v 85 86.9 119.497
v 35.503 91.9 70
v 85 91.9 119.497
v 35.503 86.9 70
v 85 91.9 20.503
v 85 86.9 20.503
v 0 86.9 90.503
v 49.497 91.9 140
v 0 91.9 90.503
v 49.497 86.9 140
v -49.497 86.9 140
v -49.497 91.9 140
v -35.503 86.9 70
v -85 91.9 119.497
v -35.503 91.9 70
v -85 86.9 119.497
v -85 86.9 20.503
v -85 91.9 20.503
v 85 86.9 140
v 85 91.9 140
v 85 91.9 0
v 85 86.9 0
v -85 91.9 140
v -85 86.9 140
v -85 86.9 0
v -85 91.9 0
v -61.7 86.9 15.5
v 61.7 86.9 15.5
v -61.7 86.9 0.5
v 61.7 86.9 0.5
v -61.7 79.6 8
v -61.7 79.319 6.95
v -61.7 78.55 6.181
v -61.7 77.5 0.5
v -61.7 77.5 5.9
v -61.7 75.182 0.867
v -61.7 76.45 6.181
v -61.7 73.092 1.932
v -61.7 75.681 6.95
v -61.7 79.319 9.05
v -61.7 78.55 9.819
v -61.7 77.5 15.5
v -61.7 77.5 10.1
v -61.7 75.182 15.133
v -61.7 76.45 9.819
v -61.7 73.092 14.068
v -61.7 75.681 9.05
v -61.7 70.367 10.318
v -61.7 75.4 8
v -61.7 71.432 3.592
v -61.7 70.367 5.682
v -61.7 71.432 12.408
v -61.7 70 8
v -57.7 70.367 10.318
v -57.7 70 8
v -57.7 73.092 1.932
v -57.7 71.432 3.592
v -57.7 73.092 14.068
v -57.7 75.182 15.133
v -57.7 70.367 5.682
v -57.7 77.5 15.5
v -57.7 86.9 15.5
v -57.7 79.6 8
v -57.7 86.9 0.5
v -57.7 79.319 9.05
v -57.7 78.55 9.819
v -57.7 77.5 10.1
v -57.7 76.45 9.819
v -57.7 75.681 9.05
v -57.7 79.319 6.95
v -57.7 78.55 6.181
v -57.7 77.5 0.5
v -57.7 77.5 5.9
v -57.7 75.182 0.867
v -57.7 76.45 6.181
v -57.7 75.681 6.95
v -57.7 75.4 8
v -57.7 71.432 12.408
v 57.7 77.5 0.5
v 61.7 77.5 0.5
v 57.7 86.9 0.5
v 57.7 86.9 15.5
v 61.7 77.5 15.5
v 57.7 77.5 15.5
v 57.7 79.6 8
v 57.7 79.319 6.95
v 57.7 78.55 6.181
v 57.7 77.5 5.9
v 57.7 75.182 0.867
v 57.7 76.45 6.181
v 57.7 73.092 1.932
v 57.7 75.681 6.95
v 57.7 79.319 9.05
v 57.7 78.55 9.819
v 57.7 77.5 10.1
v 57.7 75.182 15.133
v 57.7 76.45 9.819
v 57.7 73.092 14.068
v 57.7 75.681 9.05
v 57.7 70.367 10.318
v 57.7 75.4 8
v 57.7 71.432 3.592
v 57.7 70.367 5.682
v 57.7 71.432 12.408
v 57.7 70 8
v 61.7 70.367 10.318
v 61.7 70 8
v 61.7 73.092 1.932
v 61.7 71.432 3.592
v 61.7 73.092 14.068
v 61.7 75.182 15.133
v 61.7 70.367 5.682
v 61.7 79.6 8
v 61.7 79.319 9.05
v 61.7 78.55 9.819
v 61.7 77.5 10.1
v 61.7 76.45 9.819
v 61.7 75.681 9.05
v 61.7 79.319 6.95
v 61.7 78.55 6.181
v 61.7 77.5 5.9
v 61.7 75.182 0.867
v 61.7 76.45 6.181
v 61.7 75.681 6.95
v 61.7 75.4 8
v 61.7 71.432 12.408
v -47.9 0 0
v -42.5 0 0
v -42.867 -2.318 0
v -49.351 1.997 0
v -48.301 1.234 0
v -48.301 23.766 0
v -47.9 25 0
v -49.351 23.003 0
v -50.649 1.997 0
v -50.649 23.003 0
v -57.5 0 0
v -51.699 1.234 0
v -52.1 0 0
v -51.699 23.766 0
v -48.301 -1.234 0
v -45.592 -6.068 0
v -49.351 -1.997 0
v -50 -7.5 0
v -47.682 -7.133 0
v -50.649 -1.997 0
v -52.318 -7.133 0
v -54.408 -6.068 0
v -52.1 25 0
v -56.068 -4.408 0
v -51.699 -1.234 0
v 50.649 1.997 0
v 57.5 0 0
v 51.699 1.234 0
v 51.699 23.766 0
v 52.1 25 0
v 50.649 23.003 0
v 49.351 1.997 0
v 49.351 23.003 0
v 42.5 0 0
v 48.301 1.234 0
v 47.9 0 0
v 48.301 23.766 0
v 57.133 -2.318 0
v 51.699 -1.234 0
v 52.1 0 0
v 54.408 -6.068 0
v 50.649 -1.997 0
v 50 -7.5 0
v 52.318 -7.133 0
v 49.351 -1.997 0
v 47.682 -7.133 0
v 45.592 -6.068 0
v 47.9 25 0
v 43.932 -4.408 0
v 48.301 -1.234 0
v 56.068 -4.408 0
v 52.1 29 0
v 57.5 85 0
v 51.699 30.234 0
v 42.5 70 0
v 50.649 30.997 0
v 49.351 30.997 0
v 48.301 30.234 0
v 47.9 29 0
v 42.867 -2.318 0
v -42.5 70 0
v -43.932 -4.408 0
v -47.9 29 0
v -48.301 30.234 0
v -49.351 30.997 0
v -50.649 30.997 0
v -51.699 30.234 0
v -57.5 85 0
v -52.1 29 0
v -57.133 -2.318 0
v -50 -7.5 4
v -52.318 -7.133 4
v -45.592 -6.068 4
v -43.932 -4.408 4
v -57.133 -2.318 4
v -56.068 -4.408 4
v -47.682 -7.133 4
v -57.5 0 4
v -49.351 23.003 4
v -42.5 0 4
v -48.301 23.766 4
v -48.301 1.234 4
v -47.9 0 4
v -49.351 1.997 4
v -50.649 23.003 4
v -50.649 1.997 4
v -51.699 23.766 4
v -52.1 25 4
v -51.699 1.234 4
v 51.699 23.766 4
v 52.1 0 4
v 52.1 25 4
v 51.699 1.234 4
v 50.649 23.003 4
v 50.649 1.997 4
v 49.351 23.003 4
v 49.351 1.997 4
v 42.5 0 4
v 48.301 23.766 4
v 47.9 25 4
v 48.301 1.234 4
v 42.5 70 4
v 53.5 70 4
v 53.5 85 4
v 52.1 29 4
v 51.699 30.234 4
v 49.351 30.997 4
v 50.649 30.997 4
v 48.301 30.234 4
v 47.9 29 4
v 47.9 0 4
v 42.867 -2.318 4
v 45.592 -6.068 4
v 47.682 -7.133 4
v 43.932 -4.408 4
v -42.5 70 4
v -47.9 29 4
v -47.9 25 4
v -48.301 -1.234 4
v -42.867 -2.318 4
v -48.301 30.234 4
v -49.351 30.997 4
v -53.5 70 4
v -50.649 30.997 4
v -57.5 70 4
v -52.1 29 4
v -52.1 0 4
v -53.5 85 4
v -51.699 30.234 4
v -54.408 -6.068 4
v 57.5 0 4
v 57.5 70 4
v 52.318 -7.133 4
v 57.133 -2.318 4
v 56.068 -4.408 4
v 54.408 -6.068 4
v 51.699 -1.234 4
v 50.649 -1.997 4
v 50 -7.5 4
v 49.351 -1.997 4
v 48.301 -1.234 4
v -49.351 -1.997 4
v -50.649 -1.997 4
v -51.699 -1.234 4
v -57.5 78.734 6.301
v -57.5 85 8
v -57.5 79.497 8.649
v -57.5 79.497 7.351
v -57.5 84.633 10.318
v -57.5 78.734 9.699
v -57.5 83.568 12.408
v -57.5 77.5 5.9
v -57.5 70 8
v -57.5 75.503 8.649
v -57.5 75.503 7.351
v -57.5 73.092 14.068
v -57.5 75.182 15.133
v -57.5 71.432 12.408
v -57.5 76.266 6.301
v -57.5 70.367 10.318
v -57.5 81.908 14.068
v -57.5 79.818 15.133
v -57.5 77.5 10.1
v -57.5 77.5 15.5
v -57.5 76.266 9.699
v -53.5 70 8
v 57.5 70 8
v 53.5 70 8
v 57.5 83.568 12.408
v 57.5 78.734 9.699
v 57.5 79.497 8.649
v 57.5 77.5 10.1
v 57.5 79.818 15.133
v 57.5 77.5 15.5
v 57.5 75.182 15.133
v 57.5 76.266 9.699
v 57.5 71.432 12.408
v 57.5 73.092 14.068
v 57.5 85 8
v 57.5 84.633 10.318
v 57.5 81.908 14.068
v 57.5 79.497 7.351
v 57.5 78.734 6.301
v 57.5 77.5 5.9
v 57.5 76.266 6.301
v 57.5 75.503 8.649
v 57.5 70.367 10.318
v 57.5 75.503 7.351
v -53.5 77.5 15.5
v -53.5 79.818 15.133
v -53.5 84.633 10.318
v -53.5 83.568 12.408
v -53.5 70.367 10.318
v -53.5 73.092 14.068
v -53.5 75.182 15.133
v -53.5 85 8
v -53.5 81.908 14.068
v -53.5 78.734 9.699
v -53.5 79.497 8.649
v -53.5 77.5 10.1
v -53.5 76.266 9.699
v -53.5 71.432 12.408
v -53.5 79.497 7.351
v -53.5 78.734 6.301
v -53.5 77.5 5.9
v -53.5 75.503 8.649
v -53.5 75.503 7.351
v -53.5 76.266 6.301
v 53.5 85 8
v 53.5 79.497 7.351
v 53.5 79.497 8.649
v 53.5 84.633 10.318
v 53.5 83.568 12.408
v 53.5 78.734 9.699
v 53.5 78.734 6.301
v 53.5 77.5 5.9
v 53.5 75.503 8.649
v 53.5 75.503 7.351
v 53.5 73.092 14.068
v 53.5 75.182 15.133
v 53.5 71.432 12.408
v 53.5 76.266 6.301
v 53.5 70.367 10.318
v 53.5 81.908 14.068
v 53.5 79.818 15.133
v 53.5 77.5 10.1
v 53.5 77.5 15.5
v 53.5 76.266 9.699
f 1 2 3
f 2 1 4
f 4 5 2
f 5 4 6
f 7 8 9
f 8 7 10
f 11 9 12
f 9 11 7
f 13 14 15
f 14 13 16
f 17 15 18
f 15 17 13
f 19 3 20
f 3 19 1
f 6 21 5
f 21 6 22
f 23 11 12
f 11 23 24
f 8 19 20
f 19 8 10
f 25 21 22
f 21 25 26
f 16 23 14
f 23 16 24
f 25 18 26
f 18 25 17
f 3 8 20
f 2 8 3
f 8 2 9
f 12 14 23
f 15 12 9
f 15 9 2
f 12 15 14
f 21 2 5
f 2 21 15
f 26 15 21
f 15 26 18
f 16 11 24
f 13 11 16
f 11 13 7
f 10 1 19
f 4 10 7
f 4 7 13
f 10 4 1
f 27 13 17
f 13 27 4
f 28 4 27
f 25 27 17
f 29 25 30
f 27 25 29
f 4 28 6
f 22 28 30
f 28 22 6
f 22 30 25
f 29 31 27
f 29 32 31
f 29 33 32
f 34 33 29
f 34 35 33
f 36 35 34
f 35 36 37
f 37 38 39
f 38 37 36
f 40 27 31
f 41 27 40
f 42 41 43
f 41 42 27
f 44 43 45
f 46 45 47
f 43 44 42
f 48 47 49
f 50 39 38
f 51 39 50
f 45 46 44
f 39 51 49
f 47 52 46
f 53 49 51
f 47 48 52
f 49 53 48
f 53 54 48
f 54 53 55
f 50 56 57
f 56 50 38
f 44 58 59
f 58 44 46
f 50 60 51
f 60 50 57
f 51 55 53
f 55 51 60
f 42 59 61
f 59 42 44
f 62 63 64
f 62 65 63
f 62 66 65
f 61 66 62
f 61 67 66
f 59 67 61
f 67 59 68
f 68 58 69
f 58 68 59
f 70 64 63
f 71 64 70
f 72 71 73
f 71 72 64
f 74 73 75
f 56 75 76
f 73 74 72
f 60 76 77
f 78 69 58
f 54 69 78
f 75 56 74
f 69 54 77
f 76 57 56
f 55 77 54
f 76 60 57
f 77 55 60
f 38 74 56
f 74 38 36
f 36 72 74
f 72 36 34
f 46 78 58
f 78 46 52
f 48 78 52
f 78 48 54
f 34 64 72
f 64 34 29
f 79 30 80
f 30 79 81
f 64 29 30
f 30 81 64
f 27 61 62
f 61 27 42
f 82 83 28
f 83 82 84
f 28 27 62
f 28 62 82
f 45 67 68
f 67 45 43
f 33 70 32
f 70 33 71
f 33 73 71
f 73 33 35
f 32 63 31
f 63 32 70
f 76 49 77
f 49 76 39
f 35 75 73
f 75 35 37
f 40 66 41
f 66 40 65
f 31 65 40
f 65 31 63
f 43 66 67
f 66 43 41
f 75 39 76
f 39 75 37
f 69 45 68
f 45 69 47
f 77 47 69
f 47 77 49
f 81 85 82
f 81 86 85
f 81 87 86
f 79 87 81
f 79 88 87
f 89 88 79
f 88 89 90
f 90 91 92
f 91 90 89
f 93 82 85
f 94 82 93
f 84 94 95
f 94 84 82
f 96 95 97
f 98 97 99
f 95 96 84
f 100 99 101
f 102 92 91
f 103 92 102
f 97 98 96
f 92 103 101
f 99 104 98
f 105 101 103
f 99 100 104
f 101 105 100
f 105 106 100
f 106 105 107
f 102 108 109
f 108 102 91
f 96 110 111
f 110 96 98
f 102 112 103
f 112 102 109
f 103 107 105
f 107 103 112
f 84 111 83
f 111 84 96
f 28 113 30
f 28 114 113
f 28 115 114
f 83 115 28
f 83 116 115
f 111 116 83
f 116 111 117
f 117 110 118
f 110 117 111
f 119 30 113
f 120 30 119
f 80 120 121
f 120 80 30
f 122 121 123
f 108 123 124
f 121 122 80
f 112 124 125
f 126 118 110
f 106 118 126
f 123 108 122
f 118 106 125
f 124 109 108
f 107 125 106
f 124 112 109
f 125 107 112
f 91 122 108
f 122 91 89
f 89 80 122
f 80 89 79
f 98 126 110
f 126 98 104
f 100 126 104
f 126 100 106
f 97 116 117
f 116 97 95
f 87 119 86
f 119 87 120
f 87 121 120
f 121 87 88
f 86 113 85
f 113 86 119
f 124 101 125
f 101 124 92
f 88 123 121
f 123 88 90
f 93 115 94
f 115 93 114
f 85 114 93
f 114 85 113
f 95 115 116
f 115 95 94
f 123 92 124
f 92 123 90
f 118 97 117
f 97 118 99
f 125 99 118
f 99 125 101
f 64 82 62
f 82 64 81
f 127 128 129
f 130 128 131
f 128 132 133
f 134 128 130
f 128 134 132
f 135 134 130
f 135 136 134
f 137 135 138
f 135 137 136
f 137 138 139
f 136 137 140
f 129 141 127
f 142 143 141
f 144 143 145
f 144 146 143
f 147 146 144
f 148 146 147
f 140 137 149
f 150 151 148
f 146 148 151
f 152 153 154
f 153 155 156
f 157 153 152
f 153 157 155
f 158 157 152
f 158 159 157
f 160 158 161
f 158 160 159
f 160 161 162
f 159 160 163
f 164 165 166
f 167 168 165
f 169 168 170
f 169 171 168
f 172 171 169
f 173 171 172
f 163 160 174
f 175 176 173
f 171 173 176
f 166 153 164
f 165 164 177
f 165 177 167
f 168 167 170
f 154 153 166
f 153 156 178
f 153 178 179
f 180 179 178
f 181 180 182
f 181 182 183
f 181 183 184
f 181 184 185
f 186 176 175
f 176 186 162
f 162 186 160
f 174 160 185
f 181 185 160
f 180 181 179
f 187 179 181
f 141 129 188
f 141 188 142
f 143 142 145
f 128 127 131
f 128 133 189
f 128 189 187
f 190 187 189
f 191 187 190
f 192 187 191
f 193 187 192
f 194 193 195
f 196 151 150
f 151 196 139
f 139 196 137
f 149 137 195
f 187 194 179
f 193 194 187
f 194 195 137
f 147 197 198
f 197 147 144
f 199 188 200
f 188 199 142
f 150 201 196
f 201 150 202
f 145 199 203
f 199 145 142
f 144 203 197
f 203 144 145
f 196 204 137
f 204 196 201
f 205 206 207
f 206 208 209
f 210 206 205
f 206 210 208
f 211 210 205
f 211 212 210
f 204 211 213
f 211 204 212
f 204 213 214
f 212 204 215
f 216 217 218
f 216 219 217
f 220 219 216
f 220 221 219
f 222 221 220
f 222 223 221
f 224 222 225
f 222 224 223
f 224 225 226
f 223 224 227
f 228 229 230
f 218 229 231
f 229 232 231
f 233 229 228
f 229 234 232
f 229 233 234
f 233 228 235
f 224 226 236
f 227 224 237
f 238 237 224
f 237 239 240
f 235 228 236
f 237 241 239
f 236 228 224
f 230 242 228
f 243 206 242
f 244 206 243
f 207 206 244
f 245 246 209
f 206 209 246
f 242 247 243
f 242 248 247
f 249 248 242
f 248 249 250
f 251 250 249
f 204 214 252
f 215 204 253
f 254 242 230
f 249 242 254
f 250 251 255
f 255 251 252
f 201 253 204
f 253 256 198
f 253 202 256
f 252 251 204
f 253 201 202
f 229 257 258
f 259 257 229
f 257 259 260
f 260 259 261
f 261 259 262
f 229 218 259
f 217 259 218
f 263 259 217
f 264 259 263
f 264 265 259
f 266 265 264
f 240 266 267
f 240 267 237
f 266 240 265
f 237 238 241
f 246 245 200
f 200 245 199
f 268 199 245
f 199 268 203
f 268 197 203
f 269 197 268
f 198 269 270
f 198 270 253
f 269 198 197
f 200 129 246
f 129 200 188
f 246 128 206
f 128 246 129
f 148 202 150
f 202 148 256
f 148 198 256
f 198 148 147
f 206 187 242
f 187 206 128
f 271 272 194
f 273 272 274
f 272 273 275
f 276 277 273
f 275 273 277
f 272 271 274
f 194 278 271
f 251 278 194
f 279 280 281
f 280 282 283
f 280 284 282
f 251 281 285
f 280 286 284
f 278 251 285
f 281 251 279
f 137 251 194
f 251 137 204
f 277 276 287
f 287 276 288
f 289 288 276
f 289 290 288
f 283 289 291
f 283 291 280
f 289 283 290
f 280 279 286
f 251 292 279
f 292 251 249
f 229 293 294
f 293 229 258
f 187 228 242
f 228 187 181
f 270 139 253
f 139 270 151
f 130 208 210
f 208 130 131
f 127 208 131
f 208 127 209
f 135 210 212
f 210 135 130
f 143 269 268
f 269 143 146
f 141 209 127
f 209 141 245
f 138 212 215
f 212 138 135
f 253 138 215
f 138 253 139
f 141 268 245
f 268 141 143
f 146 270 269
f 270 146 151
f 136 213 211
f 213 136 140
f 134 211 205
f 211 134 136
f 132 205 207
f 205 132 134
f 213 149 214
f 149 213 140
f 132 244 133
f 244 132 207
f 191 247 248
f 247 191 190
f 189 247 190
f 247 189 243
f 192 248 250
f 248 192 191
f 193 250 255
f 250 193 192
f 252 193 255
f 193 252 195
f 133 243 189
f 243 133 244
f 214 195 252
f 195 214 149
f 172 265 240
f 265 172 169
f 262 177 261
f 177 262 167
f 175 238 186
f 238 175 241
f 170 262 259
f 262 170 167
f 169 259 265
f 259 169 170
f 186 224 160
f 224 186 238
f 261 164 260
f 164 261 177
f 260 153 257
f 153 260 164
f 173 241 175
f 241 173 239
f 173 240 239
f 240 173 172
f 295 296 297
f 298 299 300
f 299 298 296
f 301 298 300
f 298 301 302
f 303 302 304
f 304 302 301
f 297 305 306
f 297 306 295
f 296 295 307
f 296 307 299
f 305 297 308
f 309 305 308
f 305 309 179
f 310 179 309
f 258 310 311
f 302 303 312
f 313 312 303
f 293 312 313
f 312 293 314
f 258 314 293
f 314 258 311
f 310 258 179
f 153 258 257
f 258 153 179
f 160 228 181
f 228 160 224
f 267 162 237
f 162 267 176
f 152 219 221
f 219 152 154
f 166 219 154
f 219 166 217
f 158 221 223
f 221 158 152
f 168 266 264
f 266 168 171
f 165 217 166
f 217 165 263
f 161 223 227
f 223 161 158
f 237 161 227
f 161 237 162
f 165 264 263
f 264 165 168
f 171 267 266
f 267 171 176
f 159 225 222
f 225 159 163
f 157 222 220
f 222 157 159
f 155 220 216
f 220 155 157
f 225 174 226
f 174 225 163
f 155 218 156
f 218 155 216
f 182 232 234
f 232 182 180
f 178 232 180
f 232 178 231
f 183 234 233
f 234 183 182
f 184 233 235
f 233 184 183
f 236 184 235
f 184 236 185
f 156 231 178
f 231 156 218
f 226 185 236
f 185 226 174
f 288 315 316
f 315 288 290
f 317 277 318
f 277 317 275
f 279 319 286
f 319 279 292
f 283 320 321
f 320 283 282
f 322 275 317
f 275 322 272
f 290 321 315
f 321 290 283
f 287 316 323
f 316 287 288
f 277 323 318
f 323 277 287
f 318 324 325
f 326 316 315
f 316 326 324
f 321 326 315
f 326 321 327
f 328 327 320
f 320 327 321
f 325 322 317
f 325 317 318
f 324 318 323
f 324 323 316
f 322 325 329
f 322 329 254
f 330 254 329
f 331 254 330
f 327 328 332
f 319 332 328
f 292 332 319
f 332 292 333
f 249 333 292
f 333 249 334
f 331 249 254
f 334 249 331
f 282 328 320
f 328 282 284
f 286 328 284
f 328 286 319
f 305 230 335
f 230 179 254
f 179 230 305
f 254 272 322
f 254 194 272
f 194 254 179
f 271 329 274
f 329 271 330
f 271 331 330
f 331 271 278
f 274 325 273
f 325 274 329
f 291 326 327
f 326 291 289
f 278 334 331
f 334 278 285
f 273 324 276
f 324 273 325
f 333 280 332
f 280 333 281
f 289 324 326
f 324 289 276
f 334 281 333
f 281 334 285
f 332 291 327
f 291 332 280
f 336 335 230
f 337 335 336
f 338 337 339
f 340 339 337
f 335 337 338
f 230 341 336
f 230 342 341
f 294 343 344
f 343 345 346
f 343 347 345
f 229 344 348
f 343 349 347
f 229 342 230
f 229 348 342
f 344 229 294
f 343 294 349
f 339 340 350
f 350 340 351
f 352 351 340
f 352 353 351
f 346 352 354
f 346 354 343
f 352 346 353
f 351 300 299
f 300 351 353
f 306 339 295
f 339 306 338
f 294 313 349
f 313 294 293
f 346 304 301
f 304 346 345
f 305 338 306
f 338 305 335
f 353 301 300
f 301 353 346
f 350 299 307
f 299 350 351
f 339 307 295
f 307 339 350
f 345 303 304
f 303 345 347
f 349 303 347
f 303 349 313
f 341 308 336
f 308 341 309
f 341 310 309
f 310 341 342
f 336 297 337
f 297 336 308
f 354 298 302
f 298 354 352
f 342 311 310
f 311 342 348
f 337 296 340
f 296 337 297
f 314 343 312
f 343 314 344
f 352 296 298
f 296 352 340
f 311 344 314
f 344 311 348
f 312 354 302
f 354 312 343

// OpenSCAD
//Customizable VESA mount
//by eriqjo February 21, 2015

//TODO  redundant top plate support (rectangle between the semi-circles)

//CUSTOMIZER VARIABLES

/* [Global] */

//Which parts do you want to make?
Make_Part = 3; // [1:Back Bracket, 2:Top Plate, 3:Both]

/* [Back Bracket] */

//Choose the VESA mount size, mm
VESA_Size = 100; // [75:75x75, 100:100x100, 200:200x200]

//What are you mounting to?
Mount_To = 2; // [1:Direct to monitor/TV, 2:Wall mounting bracket]

//Mounting bolt diameter, mm:
Bolt_Dia = 4; // [3:8]

//Bracket width, mm:
Bracket_Width = 15; // [9:30]

//Bracket thickness, mm:
Bracket_Thickness = 4; // [4:20]

//Distance from top bracket hole to top of monitor/TV
Height_To_Top = 45;

/* [Top Plate] */

//Top plate style
Top_Style = 2; // [1:Solid(square), 2:Lite(x)]

//Top plate thickness, mm: 
Plate_Thickness = 5; // [3:8]

//The width of the box you are mounting, mm
Plate_Width = 170;

//The depth of the box you are mounting, mm
Plate_Depth = 140;

//How far back should the top plate be shifted, mm
Shift_Top_Back = 0;

//CUSTOMIZER VARIABLES END

slop = 0.2 * 1;

module buildBack(ydim = 25){

	topLength = Height_To_Top + ydim;

	difference(){
		union(){
			for(i = [-1, 1]){			//creating the two legs of the bracket
				translate([ i * VESA_Size/2, 0, 0])
					difference(){
						union(){
							cylinder(h = Bracket_Thickness, r = Bracket_Width/2, $fn = 20);		//bottom of leg
							translate([-Bracket_Width/2, 0, 0])									//leg
								cube([Bracket_Width, topLength, Bracket_Thickness]);			
						} // union
						translate([0, 0, -0.1])
							cylinder(h = Bracket_Thickness + slop, r = (Bolt_Dia + slop)/2, $fn = 10);	// bottom hole
						translate([0, ydim, -0.1])
							cylinder(h = Bracket_Thickness + slop, r = (Bolt_Dia + slop)/2, $fn = 10);  //bottom of slot
						translate([0, ydim + Bolt_Dia, -0.1])
							cylinder(h = Bracket_Thickness + slop, r = (Bolt_Dia + slop)/2 , $fn = 10); //top of slot
						translate([-(Bolt_Dia + slop)/2, ydim, -0.1])
							cube([Bolt_Dia + slop, Bolt_Dia, Bracket_Thickness + 0.2]);					//between the slot
					} // difference
			} // for
			translate([-Bracket_Width/2 - VESA_Size/2, topLength, 0])					//top portion of the bracket
				cube([VESA_Size + Bracket_Width, Bracket_Width, Bracket_Thickness]);
			for(i = [-1, 1]){
				translate([ i * (Bracket_Width/2 - Bracket_Thickness/2 + VESA_Size/2 ), topLength + Bracket_Width/2, Bracket_Thickness + (Bolt_Dia/2) + 2]){ // start of the semi-circle mounts
					rotate([0, 90, 0]){
						difference(){
							union(){
								cylinder( h = Bracket_Thickness, r = Bracket_Width/2, center = true, $fn = 20);
								translate([Bracket_Width/4, 0, 0,])
									cube([Bracket_Width/2, Bracket_Width, Bracket_Thickness], center = true);
							} // union
							cylinder(h = Bracket_Thickness + slop, r = (Bolt_Dia + slop)/2, center = true, $fn = 10);
						}//difference
					}//rotate	
				}//translate
			}//for	
		} // union
		translate([0, 0, -20]) {
			cube([300, 300, 40], center = true);
		}//translate
	}//difference
}//module buildBack

module buildTop(ydim = 25){	

	topLength = Height_To_Top + ydim;
	unit = min(Plate_Depth, Plate_Width)/2;
	
	union(){
		if(Top_Style == 1){		//solid square top plate
			translate([0, Plate_Thickness/2  + topLength + 1.9 + Bracket_Width, Plate_Depth/2 - Shift_Top_Back])  //original

				cube([Plate_Width, Plate_Thickness, Plate_Depth], center = true);
		}//if
		
		if(Top_Style == 2){		//Lite X-style top plate
			translate([0, Plate_Thickness/2  + topLength + 1.9 + Bracket_Width, Plate_Depth/2 - Shift_Top_Back])
				difference(){
					cube([Plate_Width, Plate_Thickness, Plate_Depth], center = true);								//plate itself
					for(i = [[Plate_Width/2, 0, 0], [0, 0, Plate_Depth/2], [-Plate_Width/2, 0, 0]]){
						translate(i)	
							rotate([0, 45, 0]){
								cube([unit, Plate_Thickness+1, unit], center = true);
							}//rotate
					}//for
				}//difference	
		}//if
		for(i = [-1,1]){
			translate([i * (Bracket_Thickness/2 + VESA_Size/2 + Bracket_Width/2 + slop), topLength + Bracket_Width/2, Bracket_Thickness + (Bolt_Dia/2) + 2]){
				rotate([0, 90, 0]){
					difference(){
						union(){
							cylinder( h = Bracket_Thickness, r = Bracket_Width/2, center = true, $fn = 20);			//swivel attachment semi-circle
							translate([0,Bracket_Width/4 + 1,0])
								cube([Bracket_Width, Bracket_Width/2 + 2, Bracket_Thickness], center = true);		//swivel attachment point
						}//union
						cylinder( h = Bracket_Thickness + slop, r = (Bolt_Dia + slop)/2, center = true, $fn = 12);  //swivel hole
					}//difference
				}//rotate	
			}//translate
		}//for
		translate([0, Plate_Thickness/2  + topLength + 1.9 + Bracket_Width, Bracket_Thickness + (Bolt_Dia/2) + 2])
			cube([2*Bracket_Thickness + VESA_Size + Bracket_Width +slop, Plate_Thickness, Bracket_Width], center = true);
	}//union		
}//module buildTop

if (Mount_To == 1){
	if(Make_Part == 1) {buildBack(ydim = VESA_Size);}
	if(Make_Part == 2) {buildTop(ydim = VESA_Size);}
	if(Make_Part == 3) {buildTop(ydim = VESA_Size); buildBack(ydim = VESA_Size);}
}// if

if (Mount_To == 2){
	if(Make_Part == 1) {buildBack(ydim = 25);}
	if(Make_Part == 2) {buildTop(ydim = 25);}
	if(Make_Part == 3) {buildTop(ydim = 25); buildBack(ydim = 25);}
}// if

